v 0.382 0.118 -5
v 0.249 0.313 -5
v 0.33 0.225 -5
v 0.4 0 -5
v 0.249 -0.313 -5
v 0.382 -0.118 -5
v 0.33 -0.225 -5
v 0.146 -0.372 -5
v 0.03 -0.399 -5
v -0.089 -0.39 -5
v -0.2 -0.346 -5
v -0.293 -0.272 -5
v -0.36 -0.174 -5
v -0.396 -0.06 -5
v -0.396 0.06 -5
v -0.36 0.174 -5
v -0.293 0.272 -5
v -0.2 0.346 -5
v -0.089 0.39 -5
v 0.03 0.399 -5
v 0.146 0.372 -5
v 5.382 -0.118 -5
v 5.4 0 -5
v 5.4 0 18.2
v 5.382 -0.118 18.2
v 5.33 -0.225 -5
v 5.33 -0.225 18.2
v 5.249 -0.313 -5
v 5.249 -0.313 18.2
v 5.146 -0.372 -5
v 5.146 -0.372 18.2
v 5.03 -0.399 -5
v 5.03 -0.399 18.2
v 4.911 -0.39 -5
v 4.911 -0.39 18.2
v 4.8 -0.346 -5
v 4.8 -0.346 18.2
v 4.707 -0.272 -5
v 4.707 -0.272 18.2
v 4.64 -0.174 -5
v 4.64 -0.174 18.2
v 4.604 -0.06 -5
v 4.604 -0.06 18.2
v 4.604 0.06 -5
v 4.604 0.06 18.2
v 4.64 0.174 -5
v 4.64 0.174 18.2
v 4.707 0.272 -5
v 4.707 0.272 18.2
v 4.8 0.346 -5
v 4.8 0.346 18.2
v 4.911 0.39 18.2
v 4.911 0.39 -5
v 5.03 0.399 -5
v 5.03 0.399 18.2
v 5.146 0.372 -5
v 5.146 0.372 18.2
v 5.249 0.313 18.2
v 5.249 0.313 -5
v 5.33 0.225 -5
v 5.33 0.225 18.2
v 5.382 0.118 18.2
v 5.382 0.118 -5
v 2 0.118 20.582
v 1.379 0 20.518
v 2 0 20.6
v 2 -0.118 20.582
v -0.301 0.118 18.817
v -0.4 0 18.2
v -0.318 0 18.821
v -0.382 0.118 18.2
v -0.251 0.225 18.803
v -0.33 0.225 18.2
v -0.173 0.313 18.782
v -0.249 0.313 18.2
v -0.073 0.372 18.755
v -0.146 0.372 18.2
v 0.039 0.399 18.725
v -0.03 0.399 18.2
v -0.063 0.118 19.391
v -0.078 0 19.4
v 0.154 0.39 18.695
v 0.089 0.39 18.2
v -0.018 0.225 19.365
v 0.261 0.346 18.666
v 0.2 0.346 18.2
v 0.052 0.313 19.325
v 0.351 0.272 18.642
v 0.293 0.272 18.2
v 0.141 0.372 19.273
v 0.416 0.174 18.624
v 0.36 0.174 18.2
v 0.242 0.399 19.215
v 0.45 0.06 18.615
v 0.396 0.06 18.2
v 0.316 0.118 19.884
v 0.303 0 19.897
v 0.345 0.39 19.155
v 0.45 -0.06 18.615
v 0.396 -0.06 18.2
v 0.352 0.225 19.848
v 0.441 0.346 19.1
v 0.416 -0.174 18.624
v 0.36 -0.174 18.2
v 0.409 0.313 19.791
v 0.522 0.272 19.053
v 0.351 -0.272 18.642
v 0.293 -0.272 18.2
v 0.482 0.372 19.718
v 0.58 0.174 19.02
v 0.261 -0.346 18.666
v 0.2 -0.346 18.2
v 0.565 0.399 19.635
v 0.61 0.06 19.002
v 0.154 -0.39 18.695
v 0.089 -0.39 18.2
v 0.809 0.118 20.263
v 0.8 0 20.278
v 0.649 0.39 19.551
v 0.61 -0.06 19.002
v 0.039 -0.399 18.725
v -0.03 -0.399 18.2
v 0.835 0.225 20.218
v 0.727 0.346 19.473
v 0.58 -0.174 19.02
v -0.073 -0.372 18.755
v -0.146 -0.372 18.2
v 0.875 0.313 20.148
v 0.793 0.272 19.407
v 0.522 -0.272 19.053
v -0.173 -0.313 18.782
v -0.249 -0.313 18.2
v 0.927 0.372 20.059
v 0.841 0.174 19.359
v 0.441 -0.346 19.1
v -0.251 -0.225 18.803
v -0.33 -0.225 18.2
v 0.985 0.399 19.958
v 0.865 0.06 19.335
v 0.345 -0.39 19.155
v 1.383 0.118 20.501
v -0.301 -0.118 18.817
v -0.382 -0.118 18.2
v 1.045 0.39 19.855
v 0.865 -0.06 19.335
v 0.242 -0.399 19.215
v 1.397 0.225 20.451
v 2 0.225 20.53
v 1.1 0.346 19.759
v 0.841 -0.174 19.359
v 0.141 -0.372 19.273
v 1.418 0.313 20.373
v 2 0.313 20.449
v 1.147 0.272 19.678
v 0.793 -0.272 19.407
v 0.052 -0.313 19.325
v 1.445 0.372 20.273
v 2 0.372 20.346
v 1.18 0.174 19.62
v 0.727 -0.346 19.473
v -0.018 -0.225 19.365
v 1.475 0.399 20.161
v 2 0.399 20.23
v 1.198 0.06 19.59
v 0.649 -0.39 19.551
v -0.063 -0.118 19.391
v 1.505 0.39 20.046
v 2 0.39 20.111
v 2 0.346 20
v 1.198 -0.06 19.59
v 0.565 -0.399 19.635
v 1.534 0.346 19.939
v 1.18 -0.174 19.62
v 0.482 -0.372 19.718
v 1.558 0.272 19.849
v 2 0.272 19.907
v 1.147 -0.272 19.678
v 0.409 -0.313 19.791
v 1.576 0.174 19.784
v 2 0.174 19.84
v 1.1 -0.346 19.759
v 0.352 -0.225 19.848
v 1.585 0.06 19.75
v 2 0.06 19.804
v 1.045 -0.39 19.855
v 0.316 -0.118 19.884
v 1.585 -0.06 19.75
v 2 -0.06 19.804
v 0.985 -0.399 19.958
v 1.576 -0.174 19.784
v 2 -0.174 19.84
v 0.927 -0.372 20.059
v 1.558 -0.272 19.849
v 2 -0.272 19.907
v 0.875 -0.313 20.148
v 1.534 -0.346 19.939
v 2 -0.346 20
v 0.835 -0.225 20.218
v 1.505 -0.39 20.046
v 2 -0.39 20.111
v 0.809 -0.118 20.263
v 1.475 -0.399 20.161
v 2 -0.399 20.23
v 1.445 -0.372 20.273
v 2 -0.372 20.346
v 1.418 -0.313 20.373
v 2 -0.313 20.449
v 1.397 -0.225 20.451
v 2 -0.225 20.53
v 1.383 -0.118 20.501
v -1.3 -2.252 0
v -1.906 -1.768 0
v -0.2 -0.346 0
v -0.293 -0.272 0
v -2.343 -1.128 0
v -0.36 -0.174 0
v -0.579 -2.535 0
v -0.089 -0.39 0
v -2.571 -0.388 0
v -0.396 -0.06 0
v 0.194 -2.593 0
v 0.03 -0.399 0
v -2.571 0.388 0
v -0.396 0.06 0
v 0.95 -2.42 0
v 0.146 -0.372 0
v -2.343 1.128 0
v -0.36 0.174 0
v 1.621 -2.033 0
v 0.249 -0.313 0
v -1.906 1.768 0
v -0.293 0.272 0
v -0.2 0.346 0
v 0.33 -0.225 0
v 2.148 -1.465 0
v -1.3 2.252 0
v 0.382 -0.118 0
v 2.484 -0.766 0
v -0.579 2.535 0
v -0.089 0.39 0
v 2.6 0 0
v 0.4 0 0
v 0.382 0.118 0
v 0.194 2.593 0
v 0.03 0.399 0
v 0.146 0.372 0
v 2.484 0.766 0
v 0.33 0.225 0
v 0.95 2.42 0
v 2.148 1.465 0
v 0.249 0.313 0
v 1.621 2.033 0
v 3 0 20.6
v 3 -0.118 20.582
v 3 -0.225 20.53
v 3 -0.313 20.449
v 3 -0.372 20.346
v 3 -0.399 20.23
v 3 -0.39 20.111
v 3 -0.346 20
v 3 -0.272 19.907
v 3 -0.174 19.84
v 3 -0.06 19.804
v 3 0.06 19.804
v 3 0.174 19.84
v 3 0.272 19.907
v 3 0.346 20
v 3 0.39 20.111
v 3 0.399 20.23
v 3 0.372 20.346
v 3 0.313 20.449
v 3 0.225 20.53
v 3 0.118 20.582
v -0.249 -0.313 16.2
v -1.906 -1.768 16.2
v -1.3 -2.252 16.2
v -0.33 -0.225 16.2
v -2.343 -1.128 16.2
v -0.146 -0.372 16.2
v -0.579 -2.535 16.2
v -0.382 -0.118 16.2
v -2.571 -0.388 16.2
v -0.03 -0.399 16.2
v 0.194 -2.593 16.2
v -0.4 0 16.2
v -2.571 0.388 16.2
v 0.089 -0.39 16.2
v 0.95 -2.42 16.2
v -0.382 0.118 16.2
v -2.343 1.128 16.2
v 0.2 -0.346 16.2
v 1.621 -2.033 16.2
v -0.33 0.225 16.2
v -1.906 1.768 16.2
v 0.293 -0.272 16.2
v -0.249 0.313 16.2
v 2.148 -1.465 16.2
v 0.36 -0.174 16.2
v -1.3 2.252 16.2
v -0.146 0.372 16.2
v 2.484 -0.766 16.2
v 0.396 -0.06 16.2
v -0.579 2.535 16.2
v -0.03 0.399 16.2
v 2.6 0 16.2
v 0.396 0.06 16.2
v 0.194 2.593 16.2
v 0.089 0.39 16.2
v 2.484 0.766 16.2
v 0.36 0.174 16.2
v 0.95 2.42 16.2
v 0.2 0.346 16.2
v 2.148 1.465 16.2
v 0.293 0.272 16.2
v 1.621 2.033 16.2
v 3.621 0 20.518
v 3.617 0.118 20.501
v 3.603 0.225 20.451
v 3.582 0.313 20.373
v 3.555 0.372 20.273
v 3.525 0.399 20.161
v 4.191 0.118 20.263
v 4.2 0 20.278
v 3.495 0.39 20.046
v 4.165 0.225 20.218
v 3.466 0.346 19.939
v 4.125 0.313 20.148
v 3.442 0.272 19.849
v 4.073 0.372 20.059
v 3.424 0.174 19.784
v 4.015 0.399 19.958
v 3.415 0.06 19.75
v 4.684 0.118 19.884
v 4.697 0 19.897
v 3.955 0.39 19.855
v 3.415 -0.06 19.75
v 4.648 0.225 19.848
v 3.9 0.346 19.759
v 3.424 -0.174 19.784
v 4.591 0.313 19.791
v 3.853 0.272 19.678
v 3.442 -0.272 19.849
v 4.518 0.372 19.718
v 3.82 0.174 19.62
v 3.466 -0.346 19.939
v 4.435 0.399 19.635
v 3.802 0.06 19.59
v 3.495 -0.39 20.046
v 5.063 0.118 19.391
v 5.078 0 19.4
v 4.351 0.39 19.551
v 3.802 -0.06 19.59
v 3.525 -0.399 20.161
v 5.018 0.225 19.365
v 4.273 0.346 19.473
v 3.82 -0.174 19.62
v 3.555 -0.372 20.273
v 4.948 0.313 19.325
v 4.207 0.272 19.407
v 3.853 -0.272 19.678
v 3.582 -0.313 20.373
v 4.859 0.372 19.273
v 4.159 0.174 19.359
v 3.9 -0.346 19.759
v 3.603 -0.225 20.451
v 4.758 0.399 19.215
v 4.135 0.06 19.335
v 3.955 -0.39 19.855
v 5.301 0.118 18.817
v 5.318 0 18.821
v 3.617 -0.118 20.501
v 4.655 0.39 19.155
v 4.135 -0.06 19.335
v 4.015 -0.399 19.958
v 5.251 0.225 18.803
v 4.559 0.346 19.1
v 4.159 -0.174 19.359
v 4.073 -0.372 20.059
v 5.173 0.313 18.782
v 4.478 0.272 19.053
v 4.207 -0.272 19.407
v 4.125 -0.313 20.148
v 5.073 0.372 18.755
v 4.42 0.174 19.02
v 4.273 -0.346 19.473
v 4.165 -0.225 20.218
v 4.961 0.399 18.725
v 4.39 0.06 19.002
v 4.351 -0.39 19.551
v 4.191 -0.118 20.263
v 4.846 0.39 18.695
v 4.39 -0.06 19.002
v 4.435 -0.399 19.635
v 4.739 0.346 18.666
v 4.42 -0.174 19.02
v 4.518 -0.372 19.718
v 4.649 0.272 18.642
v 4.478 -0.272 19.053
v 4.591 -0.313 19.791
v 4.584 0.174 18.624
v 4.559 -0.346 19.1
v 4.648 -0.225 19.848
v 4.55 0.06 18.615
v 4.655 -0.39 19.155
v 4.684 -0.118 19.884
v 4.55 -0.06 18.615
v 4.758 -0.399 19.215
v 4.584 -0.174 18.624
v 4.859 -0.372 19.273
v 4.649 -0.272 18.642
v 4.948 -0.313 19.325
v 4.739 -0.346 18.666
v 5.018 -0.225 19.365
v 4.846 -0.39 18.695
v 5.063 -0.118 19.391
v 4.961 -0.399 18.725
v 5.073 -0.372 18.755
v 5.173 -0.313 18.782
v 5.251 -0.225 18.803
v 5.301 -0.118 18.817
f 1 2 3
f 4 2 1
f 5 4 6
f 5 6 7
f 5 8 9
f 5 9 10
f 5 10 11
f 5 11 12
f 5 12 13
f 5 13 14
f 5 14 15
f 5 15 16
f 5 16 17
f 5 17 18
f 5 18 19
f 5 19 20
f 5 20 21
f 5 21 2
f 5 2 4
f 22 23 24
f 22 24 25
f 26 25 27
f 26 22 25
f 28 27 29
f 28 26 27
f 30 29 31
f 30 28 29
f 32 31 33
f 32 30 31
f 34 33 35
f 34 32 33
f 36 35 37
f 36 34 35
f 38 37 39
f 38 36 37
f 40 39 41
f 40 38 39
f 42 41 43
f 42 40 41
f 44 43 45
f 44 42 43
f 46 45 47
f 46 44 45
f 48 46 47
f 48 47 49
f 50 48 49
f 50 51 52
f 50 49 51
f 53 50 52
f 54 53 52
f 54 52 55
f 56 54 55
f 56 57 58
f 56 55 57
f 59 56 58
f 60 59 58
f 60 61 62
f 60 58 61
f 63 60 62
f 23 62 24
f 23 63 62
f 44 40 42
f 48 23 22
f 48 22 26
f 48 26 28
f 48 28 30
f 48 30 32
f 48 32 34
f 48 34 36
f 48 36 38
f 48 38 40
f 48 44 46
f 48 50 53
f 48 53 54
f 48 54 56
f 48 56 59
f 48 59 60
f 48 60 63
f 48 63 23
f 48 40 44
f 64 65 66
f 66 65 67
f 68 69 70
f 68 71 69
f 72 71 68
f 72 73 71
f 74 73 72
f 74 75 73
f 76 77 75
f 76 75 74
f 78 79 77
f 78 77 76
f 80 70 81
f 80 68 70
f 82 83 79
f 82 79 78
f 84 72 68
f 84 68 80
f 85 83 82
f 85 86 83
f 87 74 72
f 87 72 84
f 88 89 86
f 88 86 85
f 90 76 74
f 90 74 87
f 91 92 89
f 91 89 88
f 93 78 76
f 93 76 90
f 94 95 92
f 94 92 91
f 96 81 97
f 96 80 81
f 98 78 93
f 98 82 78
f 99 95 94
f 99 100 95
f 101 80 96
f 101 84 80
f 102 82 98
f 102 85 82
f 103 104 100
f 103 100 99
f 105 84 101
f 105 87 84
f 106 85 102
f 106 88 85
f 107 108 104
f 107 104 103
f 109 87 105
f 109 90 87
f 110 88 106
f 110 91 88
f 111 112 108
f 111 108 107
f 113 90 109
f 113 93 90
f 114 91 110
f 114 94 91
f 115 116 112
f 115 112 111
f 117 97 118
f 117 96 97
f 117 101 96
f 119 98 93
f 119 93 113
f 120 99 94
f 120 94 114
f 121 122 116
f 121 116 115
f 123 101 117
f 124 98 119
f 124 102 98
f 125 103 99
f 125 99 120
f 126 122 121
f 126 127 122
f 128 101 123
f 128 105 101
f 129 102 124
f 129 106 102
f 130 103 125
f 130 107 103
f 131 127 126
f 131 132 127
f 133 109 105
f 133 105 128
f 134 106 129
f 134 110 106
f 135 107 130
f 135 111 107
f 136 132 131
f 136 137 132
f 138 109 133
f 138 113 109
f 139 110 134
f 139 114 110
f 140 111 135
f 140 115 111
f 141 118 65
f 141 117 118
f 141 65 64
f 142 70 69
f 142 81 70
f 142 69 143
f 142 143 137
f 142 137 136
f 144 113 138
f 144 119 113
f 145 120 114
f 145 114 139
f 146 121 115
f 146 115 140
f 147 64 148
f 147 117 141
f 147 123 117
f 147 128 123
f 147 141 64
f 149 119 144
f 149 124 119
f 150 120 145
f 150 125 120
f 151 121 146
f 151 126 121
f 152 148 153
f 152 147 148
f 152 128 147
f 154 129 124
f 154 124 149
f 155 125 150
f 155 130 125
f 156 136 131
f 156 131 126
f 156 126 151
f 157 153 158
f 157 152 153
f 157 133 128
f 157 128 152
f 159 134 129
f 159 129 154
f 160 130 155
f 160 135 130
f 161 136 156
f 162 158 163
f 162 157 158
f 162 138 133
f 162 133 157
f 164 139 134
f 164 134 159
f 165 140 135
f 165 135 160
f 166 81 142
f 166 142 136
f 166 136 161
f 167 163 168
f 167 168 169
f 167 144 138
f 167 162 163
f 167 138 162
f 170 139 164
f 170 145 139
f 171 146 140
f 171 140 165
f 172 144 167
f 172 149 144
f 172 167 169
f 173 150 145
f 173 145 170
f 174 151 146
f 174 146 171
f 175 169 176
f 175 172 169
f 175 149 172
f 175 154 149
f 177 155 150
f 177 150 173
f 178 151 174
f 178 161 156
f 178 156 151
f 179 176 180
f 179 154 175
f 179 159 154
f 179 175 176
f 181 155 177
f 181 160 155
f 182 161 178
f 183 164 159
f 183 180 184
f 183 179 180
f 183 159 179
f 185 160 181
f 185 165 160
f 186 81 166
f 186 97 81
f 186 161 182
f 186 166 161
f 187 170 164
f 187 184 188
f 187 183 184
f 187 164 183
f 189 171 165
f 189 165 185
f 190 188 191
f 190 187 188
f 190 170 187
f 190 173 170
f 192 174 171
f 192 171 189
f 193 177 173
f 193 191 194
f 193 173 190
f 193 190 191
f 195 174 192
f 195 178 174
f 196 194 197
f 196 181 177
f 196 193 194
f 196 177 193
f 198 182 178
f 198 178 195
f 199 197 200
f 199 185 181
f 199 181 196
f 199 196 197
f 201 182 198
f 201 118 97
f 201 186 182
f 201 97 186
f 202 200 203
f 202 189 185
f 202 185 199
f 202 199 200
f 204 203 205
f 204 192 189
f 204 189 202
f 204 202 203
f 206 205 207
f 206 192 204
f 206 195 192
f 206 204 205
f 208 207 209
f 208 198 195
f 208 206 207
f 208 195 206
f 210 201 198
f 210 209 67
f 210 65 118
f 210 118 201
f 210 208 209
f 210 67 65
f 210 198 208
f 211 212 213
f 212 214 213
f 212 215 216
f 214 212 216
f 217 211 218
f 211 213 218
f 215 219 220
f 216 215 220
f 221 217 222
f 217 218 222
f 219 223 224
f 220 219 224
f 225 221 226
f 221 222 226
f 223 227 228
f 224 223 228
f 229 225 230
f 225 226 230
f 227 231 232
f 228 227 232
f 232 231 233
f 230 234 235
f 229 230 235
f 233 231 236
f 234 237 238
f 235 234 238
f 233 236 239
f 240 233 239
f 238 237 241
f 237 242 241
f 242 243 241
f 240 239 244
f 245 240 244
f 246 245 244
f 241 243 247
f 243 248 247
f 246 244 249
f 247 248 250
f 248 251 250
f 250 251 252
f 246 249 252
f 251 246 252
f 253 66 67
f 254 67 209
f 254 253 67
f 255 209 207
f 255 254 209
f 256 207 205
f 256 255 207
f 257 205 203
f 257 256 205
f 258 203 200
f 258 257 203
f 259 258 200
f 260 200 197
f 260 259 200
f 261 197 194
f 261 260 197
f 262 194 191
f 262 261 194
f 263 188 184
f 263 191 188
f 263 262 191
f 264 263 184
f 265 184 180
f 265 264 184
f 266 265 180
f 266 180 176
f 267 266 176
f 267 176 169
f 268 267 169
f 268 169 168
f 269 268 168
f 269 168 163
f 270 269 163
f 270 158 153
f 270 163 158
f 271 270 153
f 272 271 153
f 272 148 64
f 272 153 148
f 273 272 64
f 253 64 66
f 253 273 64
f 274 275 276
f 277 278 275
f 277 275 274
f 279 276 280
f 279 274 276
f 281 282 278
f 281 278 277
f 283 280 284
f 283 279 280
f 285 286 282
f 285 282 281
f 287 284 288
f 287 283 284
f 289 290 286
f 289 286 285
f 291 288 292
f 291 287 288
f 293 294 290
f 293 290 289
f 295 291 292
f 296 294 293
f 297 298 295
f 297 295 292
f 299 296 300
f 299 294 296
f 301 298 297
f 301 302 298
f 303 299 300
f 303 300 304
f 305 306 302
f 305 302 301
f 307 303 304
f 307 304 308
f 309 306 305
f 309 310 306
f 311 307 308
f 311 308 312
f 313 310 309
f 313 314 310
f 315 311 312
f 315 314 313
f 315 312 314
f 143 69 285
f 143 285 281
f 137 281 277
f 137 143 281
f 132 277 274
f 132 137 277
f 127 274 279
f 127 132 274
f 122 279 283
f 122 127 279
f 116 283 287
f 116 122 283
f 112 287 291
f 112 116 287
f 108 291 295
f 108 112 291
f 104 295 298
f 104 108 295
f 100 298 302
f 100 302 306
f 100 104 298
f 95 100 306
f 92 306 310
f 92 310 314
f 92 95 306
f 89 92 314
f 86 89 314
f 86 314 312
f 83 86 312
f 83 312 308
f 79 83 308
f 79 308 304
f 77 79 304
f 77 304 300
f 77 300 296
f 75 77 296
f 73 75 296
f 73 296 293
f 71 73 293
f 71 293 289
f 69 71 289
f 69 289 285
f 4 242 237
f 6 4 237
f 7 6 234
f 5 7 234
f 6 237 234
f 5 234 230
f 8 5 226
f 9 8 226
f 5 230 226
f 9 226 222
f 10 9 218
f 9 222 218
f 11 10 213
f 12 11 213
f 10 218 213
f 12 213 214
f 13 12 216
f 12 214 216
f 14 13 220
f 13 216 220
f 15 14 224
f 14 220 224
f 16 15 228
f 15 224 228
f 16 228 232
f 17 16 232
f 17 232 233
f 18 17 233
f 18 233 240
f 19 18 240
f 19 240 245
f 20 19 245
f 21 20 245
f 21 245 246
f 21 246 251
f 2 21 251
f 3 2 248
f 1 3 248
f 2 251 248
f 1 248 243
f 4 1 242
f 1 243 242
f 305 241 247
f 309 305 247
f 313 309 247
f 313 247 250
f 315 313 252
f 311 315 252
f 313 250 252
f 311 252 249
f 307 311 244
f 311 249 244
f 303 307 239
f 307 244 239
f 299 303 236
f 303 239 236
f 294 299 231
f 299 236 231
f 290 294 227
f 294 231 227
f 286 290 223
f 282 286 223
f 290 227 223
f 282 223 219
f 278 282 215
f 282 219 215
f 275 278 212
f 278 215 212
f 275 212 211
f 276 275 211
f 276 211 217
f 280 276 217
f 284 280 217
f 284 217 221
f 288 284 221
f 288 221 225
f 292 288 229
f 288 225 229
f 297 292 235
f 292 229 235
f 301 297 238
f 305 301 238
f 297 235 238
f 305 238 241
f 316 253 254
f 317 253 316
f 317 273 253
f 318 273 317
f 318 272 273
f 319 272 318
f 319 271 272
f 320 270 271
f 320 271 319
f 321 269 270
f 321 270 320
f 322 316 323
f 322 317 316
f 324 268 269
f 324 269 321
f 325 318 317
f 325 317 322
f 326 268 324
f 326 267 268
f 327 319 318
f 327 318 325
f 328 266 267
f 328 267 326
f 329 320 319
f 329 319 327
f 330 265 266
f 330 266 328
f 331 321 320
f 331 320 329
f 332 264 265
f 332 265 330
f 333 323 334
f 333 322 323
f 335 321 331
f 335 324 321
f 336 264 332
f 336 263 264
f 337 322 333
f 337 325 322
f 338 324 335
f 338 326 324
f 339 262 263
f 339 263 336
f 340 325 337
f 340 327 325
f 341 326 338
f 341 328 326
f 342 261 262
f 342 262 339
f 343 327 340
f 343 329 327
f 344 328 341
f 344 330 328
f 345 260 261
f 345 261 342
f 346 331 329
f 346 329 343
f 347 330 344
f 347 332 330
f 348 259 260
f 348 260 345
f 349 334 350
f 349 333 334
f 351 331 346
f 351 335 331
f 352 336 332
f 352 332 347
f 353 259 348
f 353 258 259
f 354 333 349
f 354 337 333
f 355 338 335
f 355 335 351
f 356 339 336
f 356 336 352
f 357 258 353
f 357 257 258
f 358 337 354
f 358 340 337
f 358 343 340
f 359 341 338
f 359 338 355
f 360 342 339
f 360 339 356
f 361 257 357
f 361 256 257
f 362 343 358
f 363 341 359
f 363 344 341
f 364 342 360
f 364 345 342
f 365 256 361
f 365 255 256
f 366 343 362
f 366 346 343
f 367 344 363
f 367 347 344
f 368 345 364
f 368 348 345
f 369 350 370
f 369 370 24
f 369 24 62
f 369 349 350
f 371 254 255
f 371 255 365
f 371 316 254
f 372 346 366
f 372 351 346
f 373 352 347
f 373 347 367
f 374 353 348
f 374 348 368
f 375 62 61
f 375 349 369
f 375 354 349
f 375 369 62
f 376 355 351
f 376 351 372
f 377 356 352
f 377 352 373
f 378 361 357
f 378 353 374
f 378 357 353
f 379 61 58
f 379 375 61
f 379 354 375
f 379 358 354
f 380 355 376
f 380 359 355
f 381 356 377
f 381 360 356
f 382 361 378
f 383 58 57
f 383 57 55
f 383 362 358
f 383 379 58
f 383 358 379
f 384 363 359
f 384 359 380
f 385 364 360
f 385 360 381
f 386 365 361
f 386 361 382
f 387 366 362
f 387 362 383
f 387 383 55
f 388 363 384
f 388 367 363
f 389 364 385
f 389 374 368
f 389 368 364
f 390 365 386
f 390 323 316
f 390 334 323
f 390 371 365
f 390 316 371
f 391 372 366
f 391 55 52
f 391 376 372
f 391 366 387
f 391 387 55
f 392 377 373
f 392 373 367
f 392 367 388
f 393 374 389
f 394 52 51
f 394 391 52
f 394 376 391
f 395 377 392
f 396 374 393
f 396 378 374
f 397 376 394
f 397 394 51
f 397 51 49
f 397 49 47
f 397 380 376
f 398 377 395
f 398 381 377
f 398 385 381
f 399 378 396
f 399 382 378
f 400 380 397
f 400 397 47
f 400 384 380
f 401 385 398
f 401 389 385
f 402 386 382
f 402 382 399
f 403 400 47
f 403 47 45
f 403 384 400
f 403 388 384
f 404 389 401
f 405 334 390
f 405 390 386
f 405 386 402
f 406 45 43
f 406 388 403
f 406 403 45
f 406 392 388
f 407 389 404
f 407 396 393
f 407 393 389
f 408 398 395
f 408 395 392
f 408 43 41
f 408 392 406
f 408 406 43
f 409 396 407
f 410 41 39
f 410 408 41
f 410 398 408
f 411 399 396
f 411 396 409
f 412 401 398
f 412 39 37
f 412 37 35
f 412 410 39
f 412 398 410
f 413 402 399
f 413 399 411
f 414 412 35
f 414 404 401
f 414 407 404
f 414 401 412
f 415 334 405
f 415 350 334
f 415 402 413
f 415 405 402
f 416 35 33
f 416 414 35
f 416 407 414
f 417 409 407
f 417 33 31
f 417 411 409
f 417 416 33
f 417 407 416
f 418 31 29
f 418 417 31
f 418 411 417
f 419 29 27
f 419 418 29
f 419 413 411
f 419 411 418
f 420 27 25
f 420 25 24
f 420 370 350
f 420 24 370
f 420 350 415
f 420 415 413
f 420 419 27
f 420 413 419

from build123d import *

# Parameters (mm, degrees)
SKETCH2_R           = 2.6
RESISTOR_BODY_DEPTH = 16.2
LEAD1_PROFILE_R     = 0.4
SKETCH6_R           = 0.4
LEAD2_DEPTH         = 5


with BuildPart() as part:
    # Sketch2 → Resistor Body (new body)
    with BuildSketch(Plane.XY):
        Circle(SKETCH2_R)
    extrude(amount=RESISTOR_BODY_DEPTH)

    # Lead1: sweep along a path in Lead1 Path
    with BuildLine(Plane(origin=(0, 0, 0), x_dir=(1, 0, 0), z_dir=(0, 1, 0))) as lead1_path:
        Line((0, -16.2), (0, -18.2))
        ThreePointArc((0, -18.2), (0.585786438, -19.614213562), (2, -20.2))
        Line((2, -20.2), (3, -20.2))
        ThreePointArc((3, -20.2), (4.414213562, -19.614213562), (5, -18.2))
        Line((5, -18.2), (5, 5))
    # Lead1 Profile → Lead1 (sweep)
    with BuildSketch(Plane(origin=(0, 0, 16.2), x_dir=(-1, 0, 0), z_dir=(0, 0, 1))):
        Circle(LEAD1_PROFILE_R)
    sweep(path=lead1_path.line)

    # Sketch6 → Lead2 (add)
    with BuildSketch(Plane(origin=(0, 0, 0), x_dir=(1, 0, 0), z_dir=(0, 0, -1))):
        Circle(SKETCH6_R)
    extrude(amount=LEAD2_DEPTH)


solid = part.part
